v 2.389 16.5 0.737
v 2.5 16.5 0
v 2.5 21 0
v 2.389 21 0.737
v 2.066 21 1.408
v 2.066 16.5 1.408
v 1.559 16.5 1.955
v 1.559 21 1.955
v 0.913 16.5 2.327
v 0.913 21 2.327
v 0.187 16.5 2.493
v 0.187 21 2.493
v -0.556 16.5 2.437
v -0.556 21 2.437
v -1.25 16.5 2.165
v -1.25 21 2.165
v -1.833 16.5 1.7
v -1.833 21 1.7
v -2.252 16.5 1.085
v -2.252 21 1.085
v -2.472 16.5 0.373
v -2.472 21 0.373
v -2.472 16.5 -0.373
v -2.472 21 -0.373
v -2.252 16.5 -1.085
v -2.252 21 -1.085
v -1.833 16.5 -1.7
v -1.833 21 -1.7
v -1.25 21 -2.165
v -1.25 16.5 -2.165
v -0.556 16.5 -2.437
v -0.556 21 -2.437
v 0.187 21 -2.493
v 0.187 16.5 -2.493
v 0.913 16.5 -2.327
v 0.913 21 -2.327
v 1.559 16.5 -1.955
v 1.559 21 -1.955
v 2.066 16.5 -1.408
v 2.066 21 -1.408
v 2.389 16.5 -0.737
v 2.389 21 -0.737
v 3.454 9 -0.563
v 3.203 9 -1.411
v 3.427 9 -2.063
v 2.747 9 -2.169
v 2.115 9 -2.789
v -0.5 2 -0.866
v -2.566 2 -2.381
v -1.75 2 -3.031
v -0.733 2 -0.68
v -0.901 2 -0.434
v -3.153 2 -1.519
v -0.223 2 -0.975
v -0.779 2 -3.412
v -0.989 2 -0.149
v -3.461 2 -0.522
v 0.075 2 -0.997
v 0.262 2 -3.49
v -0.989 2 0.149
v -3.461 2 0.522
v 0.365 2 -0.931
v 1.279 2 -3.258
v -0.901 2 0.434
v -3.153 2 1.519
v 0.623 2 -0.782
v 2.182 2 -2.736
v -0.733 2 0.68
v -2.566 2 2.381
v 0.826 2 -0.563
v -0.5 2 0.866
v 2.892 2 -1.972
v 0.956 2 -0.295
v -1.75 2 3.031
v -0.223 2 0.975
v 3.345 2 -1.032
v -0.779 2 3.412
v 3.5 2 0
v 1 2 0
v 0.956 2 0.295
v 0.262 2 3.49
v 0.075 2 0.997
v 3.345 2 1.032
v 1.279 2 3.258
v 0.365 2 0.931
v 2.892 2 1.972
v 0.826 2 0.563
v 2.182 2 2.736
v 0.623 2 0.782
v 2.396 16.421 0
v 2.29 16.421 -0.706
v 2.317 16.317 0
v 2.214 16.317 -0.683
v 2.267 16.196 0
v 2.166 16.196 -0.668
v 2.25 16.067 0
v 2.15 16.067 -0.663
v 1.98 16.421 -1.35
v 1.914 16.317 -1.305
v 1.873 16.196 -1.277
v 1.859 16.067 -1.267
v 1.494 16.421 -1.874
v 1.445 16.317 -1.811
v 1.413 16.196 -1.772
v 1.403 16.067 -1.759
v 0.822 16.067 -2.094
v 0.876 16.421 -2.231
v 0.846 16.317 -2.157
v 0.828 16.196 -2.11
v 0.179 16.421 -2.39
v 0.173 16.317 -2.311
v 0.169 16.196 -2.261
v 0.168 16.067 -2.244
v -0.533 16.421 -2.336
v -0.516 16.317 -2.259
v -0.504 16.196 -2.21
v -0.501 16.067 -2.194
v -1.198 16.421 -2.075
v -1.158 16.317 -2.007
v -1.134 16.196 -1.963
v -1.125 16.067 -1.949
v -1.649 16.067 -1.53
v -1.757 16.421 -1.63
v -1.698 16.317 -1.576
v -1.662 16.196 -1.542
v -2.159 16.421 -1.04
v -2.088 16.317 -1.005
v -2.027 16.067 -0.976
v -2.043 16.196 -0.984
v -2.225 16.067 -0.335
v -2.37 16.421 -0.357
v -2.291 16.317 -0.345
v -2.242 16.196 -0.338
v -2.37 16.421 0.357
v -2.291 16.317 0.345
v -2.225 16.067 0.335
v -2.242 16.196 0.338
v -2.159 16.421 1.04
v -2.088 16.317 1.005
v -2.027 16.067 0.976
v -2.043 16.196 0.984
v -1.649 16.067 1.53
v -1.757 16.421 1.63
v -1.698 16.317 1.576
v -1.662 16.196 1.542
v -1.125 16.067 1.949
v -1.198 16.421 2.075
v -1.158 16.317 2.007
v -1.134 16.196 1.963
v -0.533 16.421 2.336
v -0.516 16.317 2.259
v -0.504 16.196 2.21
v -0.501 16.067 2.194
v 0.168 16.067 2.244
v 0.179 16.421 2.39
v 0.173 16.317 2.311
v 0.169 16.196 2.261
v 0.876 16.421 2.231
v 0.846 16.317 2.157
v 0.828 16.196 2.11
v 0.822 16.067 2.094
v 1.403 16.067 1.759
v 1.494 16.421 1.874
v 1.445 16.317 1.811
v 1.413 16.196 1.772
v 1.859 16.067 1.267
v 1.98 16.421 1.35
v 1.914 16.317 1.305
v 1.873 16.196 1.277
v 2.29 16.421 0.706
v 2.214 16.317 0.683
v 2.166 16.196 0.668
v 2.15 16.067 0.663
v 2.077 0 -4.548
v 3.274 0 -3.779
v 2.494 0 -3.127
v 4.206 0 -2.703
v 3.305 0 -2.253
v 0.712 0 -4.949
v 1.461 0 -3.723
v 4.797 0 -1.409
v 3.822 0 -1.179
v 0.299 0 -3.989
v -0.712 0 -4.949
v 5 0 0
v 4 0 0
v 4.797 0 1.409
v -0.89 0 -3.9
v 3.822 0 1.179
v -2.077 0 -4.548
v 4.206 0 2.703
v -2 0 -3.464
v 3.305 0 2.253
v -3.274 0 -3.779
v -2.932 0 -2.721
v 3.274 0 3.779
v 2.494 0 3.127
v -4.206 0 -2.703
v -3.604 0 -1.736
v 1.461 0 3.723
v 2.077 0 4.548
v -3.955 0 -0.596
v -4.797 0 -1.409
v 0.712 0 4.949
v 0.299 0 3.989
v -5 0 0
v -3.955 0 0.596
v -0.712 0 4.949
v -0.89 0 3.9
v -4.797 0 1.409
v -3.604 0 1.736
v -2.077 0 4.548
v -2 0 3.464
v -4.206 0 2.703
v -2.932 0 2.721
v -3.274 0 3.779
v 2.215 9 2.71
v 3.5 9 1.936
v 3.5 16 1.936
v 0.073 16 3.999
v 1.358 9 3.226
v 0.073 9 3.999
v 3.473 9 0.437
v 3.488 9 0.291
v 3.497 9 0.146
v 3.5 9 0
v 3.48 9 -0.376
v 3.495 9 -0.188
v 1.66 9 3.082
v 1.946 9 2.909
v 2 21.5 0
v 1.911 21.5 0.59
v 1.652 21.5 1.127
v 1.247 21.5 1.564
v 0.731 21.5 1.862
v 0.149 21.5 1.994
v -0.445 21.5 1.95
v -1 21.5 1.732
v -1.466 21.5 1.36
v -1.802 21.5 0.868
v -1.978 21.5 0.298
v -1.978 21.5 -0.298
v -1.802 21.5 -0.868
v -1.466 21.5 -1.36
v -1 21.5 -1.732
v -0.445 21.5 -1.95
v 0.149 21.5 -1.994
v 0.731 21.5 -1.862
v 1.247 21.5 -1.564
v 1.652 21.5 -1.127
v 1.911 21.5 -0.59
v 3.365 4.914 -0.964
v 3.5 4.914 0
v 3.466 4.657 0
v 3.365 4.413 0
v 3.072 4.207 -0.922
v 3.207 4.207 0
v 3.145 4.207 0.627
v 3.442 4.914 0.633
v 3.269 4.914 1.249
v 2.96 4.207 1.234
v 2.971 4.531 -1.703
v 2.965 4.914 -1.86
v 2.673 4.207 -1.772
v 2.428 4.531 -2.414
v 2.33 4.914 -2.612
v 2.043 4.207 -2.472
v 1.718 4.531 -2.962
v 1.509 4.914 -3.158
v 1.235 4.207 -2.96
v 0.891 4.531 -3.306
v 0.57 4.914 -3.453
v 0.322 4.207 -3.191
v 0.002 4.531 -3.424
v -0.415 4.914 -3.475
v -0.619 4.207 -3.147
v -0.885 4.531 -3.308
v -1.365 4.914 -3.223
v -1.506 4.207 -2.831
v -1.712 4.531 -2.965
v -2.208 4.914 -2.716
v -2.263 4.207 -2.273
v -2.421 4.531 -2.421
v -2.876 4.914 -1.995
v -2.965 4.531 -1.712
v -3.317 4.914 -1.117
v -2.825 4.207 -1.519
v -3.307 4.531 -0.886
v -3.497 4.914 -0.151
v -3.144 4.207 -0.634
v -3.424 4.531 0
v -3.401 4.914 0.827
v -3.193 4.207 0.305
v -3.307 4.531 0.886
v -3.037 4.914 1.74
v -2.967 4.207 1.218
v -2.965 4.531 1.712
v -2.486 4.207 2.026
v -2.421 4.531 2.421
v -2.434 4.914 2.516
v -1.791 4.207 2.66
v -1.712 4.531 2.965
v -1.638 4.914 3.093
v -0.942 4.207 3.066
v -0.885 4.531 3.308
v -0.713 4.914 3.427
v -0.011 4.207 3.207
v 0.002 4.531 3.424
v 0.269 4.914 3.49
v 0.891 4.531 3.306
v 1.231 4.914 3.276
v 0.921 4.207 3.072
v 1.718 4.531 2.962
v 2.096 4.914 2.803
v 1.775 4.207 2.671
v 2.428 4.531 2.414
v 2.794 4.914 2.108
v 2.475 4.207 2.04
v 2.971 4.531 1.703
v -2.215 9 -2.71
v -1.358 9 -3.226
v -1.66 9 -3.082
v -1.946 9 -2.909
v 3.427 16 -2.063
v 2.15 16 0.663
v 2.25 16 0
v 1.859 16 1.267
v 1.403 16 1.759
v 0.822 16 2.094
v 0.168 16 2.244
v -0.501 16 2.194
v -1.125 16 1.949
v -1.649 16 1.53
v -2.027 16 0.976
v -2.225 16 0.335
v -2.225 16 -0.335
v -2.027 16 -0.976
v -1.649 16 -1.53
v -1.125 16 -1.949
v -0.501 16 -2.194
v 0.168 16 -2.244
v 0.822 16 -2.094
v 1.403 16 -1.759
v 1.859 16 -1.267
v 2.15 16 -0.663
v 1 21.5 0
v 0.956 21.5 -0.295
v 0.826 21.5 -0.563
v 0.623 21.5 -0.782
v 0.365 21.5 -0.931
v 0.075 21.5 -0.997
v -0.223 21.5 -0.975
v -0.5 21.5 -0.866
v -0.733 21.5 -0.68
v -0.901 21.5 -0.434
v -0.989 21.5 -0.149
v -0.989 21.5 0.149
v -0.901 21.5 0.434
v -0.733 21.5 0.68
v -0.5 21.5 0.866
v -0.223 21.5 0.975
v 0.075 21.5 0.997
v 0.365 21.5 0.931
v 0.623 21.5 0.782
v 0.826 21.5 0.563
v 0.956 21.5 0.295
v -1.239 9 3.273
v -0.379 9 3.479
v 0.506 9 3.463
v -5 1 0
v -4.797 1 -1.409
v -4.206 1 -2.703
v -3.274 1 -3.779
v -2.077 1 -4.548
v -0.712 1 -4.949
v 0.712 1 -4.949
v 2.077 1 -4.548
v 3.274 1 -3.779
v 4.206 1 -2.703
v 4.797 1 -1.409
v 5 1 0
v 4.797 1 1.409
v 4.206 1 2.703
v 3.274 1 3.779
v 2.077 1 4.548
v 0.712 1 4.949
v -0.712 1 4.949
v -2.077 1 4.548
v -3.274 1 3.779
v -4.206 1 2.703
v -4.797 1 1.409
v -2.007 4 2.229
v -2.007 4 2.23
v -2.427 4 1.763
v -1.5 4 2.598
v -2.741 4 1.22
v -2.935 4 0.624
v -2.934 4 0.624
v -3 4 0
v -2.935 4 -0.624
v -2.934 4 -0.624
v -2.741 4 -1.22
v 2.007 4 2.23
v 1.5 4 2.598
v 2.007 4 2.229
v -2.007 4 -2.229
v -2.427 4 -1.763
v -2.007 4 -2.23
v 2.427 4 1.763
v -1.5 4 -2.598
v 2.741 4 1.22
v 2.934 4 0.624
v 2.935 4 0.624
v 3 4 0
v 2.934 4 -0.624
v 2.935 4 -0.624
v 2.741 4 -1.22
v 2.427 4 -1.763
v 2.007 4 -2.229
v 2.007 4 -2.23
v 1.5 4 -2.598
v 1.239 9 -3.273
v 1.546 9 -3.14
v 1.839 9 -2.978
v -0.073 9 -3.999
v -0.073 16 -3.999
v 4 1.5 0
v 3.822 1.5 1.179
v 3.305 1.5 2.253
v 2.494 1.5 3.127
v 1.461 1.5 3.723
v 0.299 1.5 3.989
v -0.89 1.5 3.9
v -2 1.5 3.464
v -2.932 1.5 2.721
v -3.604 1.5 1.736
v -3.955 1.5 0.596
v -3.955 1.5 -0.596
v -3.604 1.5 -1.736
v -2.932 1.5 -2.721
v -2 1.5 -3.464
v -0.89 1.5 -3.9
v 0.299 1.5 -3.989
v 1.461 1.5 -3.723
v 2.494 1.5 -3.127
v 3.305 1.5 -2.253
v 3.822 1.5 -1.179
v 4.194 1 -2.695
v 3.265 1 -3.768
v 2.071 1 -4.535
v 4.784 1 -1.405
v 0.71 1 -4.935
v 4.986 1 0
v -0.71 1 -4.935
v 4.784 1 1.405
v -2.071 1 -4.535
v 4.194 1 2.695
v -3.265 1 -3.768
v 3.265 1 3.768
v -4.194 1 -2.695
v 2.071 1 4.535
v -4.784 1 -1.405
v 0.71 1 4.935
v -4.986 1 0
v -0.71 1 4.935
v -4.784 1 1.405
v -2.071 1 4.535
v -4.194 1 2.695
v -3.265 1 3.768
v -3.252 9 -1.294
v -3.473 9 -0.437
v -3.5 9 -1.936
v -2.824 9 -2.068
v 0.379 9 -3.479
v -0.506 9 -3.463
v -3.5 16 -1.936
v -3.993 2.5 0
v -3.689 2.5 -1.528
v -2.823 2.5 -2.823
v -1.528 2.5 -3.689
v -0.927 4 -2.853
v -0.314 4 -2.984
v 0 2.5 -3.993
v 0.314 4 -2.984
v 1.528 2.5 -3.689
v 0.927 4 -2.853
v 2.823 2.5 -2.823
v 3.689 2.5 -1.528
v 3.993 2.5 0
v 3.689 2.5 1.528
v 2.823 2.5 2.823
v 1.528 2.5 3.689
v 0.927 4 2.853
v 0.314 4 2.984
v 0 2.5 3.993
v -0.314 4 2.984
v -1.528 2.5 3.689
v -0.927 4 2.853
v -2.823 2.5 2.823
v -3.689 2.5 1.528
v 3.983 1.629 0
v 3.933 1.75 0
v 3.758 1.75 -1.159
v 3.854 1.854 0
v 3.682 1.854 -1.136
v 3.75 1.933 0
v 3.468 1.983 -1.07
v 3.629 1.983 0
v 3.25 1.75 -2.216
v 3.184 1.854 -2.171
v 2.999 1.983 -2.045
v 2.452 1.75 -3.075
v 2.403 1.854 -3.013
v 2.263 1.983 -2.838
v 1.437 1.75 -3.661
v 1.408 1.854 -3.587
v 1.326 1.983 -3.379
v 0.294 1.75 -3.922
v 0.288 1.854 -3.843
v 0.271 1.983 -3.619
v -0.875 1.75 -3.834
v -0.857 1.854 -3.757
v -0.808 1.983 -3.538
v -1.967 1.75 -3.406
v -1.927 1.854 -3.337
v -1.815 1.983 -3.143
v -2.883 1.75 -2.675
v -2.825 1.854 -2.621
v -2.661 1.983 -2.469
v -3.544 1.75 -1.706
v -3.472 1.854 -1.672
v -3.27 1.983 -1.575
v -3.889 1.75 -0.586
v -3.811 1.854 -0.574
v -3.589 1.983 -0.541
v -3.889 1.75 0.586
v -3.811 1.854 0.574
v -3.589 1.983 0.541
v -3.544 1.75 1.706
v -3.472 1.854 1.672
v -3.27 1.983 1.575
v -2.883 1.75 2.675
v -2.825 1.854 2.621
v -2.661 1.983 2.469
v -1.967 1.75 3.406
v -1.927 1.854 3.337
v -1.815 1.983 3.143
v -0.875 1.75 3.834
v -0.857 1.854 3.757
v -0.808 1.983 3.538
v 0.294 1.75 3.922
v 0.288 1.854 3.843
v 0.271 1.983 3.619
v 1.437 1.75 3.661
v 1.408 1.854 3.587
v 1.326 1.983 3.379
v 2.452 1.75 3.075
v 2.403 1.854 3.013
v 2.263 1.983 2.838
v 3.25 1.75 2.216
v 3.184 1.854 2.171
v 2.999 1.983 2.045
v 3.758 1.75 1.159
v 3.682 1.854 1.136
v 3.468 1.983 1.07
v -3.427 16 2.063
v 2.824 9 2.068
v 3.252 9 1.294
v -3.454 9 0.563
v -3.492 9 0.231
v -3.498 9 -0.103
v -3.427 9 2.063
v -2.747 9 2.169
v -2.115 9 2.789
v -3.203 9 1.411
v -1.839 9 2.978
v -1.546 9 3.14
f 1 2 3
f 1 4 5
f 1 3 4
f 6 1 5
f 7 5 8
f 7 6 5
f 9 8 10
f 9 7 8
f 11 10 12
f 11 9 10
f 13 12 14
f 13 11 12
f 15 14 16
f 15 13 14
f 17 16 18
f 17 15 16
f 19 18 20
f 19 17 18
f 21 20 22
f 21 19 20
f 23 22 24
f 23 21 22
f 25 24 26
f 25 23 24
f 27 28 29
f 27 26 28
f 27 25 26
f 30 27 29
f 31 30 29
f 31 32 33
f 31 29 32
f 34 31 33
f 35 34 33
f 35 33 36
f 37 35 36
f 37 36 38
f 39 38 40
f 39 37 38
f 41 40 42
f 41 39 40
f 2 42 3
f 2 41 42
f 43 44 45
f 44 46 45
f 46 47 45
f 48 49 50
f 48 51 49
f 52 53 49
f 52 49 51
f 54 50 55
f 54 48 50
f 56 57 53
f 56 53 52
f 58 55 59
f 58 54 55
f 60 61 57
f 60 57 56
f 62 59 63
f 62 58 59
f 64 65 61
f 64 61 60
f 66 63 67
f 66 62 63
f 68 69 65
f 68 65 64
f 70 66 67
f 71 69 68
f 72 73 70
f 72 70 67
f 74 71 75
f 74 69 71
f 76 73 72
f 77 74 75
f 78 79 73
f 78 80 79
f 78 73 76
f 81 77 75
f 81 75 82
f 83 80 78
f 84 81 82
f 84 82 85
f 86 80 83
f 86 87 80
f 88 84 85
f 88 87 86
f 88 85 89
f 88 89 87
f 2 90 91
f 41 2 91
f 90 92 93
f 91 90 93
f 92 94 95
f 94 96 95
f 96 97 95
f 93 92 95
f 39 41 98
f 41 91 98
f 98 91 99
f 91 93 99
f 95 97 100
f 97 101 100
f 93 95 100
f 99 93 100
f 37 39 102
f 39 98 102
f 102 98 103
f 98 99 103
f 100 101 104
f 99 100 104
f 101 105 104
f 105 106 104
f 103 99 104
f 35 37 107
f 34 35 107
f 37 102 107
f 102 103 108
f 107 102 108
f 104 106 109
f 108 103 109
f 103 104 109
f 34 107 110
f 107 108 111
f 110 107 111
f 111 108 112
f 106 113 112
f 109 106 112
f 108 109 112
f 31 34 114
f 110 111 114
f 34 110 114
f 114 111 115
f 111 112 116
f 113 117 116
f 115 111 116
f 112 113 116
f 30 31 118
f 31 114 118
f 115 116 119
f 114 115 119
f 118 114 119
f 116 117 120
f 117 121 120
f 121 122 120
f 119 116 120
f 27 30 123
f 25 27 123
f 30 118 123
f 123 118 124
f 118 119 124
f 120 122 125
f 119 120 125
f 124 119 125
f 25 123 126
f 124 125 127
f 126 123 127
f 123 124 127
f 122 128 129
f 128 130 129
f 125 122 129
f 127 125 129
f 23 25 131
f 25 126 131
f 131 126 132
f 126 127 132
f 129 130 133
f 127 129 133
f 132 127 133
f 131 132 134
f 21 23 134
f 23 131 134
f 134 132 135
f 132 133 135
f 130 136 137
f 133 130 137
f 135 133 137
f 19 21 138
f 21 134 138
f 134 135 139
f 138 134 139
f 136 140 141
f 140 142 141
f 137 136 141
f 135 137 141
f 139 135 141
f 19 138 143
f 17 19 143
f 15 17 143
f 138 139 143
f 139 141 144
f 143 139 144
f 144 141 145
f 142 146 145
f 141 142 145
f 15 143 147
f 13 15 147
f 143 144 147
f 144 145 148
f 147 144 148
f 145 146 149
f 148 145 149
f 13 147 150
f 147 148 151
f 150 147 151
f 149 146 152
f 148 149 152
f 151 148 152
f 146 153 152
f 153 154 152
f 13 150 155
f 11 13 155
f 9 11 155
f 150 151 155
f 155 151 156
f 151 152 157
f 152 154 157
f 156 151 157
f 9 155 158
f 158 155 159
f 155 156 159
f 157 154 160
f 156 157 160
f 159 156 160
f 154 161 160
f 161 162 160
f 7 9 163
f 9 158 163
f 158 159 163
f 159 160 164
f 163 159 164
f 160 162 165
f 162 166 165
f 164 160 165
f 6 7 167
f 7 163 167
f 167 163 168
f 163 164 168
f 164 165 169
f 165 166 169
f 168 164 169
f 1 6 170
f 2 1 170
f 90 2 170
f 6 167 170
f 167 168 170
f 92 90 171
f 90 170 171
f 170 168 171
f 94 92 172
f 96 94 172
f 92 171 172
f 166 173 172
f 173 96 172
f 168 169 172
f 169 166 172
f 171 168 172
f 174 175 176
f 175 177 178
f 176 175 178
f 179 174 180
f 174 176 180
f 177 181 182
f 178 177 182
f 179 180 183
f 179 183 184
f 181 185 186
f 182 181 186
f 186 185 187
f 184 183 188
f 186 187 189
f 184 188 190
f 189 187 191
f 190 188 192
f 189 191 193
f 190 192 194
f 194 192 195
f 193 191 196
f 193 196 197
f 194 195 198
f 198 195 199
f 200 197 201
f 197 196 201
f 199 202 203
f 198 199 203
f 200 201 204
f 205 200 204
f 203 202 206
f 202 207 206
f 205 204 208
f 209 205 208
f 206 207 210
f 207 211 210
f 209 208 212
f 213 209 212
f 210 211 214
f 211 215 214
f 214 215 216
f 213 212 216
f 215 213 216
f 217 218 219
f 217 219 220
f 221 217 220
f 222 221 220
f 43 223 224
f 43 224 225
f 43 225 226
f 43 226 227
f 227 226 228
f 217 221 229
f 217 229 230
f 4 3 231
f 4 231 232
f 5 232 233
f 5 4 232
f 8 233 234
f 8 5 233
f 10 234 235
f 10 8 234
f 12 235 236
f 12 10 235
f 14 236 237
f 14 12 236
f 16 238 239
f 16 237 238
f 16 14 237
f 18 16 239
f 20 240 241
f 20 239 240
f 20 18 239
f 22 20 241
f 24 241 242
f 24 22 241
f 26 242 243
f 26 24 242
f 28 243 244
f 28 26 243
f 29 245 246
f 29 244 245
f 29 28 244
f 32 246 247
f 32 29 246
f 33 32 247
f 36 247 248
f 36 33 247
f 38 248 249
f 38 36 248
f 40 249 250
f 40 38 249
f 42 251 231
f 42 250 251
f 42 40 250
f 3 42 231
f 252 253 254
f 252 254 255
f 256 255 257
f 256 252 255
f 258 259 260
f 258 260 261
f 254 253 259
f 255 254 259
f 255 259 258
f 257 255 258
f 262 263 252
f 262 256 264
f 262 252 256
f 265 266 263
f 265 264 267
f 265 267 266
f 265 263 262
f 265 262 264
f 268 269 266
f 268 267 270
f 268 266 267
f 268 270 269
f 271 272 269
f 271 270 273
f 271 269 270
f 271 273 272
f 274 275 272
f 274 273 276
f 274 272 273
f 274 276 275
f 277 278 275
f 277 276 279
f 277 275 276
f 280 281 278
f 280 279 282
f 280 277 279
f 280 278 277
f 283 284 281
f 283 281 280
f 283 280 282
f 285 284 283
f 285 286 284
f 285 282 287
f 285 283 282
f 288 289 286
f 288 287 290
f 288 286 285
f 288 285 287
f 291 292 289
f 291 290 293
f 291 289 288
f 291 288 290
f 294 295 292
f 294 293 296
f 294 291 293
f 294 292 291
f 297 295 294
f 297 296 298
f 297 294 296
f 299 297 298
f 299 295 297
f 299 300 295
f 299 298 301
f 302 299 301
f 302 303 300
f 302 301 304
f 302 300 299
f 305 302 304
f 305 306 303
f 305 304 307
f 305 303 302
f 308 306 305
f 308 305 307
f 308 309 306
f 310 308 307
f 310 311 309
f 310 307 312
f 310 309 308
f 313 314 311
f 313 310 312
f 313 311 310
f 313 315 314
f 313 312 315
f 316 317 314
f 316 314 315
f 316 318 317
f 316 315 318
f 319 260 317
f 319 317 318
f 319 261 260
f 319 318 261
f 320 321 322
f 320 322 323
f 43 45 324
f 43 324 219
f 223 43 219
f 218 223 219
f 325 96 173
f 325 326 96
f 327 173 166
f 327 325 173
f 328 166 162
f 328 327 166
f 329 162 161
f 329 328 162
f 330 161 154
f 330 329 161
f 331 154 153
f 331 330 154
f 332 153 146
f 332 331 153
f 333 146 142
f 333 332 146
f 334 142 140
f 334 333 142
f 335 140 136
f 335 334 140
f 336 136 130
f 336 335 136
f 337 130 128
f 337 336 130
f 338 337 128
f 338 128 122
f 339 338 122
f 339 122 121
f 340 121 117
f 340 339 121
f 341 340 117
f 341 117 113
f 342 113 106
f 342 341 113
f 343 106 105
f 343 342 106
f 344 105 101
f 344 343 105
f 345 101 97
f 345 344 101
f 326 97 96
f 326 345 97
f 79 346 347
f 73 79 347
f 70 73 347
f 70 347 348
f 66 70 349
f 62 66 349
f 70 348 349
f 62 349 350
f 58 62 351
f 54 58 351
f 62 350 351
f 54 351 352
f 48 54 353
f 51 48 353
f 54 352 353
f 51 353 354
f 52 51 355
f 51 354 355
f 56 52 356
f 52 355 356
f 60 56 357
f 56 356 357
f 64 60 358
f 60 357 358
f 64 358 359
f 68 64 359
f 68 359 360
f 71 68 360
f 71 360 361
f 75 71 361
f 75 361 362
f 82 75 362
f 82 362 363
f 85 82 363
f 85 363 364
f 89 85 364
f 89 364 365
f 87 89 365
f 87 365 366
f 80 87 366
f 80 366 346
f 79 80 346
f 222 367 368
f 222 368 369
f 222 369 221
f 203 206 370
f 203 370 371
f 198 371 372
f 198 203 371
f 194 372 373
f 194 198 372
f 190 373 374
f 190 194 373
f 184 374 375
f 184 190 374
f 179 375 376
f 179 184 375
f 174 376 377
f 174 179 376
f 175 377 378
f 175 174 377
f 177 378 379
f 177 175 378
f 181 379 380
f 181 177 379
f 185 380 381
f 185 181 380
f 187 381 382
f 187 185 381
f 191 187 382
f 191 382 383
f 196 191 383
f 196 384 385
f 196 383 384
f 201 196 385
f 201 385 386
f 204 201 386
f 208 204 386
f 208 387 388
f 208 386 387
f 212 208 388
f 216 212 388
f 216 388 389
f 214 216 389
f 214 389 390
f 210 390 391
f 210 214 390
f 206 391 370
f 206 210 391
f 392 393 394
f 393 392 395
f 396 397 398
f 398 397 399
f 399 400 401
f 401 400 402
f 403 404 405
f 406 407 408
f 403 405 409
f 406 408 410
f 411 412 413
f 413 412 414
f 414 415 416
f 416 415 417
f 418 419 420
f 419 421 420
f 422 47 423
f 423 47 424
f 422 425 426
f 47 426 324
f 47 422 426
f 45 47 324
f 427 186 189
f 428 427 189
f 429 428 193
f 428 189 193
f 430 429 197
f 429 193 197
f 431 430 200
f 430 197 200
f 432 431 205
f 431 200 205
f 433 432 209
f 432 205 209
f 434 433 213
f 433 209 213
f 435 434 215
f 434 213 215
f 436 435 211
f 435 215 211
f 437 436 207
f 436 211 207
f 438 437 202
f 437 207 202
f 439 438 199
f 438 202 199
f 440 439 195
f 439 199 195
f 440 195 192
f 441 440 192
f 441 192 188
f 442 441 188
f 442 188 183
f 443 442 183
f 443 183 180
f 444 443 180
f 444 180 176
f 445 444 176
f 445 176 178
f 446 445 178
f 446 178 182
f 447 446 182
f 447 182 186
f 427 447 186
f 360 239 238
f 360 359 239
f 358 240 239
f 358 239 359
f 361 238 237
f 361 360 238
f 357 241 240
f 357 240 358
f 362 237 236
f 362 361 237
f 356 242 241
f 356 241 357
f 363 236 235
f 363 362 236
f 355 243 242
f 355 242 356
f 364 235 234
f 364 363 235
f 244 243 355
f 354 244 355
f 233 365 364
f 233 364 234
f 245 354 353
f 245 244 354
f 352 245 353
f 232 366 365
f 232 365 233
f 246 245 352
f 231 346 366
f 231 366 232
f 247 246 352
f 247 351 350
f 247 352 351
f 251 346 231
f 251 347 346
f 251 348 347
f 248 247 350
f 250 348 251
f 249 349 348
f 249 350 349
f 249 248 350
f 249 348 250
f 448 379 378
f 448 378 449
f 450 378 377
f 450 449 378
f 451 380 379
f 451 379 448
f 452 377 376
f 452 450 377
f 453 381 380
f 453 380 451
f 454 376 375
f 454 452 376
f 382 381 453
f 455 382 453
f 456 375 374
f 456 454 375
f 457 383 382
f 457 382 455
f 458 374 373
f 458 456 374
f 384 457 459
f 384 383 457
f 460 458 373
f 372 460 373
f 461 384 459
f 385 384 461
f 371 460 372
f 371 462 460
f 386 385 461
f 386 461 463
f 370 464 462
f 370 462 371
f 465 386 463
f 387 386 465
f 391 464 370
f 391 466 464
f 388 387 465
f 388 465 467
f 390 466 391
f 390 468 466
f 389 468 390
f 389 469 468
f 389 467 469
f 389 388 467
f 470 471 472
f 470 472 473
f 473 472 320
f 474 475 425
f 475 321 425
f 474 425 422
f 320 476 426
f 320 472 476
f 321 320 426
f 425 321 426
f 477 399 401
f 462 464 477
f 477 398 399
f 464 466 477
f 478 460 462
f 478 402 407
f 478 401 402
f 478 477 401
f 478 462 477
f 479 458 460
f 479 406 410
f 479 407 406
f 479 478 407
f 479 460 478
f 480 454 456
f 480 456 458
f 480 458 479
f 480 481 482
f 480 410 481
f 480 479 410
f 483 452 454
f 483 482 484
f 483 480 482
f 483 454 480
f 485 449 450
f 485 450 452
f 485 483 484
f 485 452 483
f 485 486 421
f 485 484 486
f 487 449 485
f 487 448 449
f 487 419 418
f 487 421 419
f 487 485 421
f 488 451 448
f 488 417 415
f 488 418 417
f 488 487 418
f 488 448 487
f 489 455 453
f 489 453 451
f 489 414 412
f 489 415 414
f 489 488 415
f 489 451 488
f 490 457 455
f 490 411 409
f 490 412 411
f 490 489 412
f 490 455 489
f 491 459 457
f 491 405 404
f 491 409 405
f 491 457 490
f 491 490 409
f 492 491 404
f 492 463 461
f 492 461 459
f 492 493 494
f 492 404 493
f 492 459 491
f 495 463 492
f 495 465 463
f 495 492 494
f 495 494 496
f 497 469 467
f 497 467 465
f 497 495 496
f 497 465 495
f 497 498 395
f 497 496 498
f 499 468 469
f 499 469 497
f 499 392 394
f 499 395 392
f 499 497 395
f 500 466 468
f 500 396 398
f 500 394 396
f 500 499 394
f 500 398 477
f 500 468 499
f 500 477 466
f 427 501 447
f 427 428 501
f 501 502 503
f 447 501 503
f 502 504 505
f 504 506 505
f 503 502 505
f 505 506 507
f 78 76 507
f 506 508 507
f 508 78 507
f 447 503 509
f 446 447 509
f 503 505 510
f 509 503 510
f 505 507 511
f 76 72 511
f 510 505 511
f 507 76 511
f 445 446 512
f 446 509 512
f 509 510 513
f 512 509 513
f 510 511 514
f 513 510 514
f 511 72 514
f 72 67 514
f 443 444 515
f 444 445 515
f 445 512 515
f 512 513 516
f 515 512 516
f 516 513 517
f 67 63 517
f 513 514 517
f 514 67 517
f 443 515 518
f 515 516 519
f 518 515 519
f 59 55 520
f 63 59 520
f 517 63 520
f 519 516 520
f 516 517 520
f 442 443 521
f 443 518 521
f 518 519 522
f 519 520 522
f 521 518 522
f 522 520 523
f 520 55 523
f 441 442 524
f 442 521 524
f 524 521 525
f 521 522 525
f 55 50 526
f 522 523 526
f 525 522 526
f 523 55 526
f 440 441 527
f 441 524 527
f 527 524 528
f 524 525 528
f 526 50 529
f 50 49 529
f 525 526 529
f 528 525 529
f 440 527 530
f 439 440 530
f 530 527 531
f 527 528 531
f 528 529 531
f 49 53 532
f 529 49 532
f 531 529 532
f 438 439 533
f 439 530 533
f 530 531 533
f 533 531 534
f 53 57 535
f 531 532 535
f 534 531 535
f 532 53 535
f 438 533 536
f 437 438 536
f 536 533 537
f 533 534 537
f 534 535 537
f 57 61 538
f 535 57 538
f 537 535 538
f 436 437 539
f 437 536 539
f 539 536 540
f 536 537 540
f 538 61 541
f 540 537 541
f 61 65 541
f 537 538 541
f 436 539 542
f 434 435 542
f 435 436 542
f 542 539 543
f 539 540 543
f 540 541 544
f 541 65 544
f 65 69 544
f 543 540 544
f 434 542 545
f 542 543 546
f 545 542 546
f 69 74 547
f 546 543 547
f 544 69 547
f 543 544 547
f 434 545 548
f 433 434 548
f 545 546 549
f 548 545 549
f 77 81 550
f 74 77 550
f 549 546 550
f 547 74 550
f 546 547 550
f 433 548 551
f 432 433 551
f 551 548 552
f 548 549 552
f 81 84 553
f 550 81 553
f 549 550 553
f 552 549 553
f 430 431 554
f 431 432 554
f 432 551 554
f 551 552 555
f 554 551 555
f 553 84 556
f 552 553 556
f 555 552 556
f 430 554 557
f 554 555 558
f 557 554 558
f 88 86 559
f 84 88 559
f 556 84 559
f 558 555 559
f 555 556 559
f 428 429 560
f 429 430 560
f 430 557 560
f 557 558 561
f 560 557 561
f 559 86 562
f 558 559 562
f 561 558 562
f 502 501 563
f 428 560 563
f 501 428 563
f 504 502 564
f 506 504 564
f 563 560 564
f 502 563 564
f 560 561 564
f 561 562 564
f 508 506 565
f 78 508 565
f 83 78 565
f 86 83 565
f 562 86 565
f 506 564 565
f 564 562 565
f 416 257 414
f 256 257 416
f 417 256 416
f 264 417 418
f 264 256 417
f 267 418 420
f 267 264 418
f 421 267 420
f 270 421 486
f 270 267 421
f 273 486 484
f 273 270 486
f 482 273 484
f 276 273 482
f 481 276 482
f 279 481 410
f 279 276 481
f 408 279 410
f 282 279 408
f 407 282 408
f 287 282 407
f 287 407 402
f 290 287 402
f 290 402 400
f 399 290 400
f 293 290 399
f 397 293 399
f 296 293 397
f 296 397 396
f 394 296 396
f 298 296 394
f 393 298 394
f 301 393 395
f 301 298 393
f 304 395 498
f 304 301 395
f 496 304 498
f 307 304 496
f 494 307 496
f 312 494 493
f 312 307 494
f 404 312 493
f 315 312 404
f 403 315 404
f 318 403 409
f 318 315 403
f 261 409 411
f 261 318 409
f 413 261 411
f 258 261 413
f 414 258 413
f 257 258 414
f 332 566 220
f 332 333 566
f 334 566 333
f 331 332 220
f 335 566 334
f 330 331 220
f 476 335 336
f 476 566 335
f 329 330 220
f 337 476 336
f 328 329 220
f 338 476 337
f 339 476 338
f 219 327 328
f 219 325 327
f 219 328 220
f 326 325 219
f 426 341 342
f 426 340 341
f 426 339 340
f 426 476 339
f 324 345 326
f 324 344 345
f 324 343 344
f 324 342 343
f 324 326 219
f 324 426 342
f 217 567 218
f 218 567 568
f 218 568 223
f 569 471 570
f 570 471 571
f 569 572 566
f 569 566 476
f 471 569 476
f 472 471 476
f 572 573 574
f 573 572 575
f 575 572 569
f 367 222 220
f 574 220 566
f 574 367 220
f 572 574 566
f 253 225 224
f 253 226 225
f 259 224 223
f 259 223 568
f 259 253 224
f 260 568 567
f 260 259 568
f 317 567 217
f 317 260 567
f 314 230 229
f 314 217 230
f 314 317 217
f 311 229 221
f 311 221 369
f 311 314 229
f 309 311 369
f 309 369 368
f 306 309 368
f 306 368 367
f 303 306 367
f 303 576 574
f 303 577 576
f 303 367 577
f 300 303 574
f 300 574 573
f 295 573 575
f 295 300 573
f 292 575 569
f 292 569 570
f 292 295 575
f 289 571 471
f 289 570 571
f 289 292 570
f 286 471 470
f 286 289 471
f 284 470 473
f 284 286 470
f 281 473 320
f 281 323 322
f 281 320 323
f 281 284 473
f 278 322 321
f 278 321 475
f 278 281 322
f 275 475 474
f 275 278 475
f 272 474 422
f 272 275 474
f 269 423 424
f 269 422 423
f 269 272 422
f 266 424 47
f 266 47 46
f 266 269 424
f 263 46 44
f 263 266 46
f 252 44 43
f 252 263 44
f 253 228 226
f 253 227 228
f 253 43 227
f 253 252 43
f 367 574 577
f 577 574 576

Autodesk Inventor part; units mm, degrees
ref_plane "YZ Plane" through (0, 0, 0) normal (1, 0, 0) x (0, 1, 0)
ref_plane "XZ Plane" through (0, 0, 0) normal (0, 1, 0) x (-1, 0, 0)
ref_plane "XY Plane" through (0, 0, 0) normal (0, 0, 1) x (1, 0, 0)
sketch "Sketch1" plane through (0, 0, 0) normal (0, 1, 0) x (-1, 0, 0)
  circle A0 centre (0, 0) radius 5
  circle A1 centre (0, 0) radius 3
  dimension "d35" = 10
  dimension "d36" = 6
extrude "Extrusion11" add sketch "Sketch1" along normal blind 4 contours A1
extrude "Extrusion12" add sketch "Sketch1" along normal blind 1
draft "FaceDraft2" angle 33.5 pull direction (0, 1, 0) faces at (-2.9903, 3, -0.2414) fixed edges at (3, 4, 0)
sketch "Sketch8" plane through (0, 4, 0) normal (0, 1, 0) x (1, 0, 0)
  circle A0 centre (0, 0) radius 3.5
  dimension "d42" = 7
extrude "Extrusion13" add sketch "Sketch8" along normal blind 5
chamfer "Chamfer2" distance 0.5 angle 45 1 edges at (-3.5, 4, 0)
fillet "Fillet1" radius 1 1 edges at (-3.5, 4.4999, 0)
sketch "Sketch9" plane through (0, 9, 0) normal (0, 1, 0) x (1, 0, 0)
  circle A0 centre (0, 0) radius 4
  line L0 (3.5, -1.9365) -> (0.0729, -3.9993)
  line L1 (0.0729, -3.9993) -> (-3.4271, -2.0628)
  line L2 (-3.4271, -2.0628) -> (-3.5, 1.9365)
  line L3 (-3.5, 1.9365) -> (-0.0729, 3.9993)
  line L4 (-0.0729, 3.9993) -> (3.4271, 2.0628)
  line L5 (3.4271, 2.0628) -> (3.5, -1.9365)
  circle A1 centre (0, 0) radius 3.5
  point P0 (1.3581, -3.2258)
  point P1 (-1.2396, -3.2732)
  point P2 (-2.1146, -2.789)
  point P3 (-3.4544, -0.5631)
  point P4 (-3.4726, 0.4367)
  point P5 (-2.2149, 2.7101)
  point P6 (-1.3581, 3.2258)
  point P7 (1.2396, 3.2732)
  point P8 (2.1146, 2.789)
  point P9 (3.4544, 0.5631)
  point P10 (3.4726, -0.4367)
  point P11 (2.2149, -2.7101)
  dimension "d49" = 8
extrude "Extrusion14" add sketch "Sketch9" along normal blind 7 contours L5 A1 L4 | L0 A1 L5 | L4 A1 L3 | A1 L5 L0 L1 L2 L3 L4 | L1 A1 L0 | L3 A1 L2 | L2 A1 L1
sketch "Sketch10" plane through (0, 16, 0) normal (0, 1, 0) x (1, 0, 0)
  circle A0 centre (0, 0) radius 2.5
  circle A1 centre (0, 0) radius 2.25
  dimension "d54" = 5
  dimension "d55" = 4.5
extrude "Extrusion16" add sketch "Sketch10" along normal blind 0.5 contours A1
sketch "Sketch11" plane through (0, 16.5, 0) normal (0, 1, 0) x (1, 0, 0)
  circle A0 centre (0, 0) radius 2.5
  dimension "d58" = 5
extrude "Extrusion18" add sketch "Sketch11" along normal blind 5
fillet "Fillet2" radius 0.5 1 edges at (-2.25, 16.5, 0)
thread "Thread2" size "M5x0.8" class "6g" standard "ANSI Metric M Profile" full length
chamfer "Chamfer3" distance 0.5 angle 45 1 edges at (-2.5, 21.5, 0)
sketch "Sketch12" plane through (0, 0, 0) normal (0, -1, 0) x (1, 0, 0)
  circle A0 centre (0, 0) radius 4
  dimension "d70" = 8
extrude "Extrusion19" cut sketch "Sketch12" against normal blind 2
fillet "Fillet3" radius 0.5 1 edges at (-4, 2, 0)
sketch "Sketch13" plane through (0, 21.5, 0) normal (0, 1, 0) x (1, 0, 0)
  circle A0 centre (0, 0) radius 1
  dimension "d74" = 2
extrude "Extrusion20" cut sketch "Sketch13" against normal up to next
properties part number "cup"
